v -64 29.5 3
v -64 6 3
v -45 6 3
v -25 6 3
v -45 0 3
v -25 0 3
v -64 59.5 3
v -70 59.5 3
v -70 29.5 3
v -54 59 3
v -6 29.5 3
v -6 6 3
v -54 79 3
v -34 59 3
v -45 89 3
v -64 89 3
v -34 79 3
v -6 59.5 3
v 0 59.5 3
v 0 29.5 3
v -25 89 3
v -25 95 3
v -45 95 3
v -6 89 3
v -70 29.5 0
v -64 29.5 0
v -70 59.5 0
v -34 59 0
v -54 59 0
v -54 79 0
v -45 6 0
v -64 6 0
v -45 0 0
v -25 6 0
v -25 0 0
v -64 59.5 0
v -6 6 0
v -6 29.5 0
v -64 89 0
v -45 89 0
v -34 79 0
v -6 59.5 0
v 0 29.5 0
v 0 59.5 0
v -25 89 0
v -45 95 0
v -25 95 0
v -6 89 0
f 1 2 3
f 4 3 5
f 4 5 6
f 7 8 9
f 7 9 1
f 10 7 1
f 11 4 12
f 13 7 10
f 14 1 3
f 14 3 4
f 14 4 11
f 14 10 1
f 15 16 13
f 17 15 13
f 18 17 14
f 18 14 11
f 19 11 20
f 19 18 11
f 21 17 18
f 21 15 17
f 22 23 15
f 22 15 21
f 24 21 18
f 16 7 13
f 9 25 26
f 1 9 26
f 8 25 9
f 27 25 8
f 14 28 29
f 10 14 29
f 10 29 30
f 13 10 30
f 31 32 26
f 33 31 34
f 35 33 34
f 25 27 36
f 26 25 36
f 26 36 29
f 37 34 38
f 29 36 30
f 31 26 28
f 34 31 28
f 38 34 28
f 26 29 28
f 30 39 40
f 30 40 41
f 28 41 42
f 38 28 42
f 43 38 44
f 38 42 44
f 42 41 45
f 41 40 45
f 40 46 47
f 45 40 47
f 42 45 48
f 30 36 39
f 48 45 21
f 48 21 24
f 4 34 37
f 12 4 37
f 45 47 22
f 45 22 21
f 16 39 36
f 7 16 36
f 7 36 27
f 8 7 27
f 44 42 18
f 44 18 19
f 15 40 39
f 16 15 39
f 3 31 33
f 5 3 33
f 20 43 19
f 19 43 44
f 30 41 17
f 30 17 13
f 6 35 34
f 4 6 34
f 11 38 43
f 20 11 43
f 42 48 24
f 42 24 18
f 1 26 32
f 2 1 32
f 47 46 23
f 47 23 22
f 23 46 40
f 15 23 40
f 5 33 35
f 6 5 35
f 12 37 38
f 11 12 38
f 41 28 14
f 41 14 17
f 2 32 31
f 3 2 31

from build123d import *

# Parameters (mm, degrees)
ESQUISSE1_W             = 70
ESQUISSE1_H             = 95
BOSS_EXTRU_1_DEPTH      = 3
ESQUISSE2_W             = 20
ESQUISSE2_H             = 20
ENL_V_MAT_EXTRU_1_DEPTH = 119.042365276


with BuildPart() as part:
    # Esquisse1 → Boss.-Extru.1 (new body)
    with BuildSketch(Plane.XY):
        with Locations((-35, 47.5)):
            Rectangle(ESQUISSE1_W, ESQUISSE1_H)
    extrude(amount=BOSS_EXTRU_1_DEPTH)

    # Esquisse2 → Enlèv. mat.-Extru.1 (cut, through all)
    with BuildSketch(Plane(origin=(0, 0, 0), x_dir=(-1, 0, 0), z_dir=(0, 0, -1))):
        Polygon((0, 95), (25, 95), (25, 89), (6, 89), (6, 59.5), (0, 59.5), align=None)
        Polygon((70, 95), (45, 95), (45, 89), (64, 89), (64, 59.5), (70, 59.5), align=None)
        Polygon((0, 0), (25, 0), (25, 6), (6, 6), (6, 29.5), (0, 29.5), align=None)
        Polygon((45, 0), (70, 0), (70, 29.5), (64, 29.5), (64, 6), (45, 6), align=None)
        with Locations((44, 69)):
            Rectangle(ESQUISSE2_W, ESQUISSE2_H)
    extrude(amount=-ENL_V_MAT_EXTRU_1_DEPTH, mode=Mode.SUBTRACT)


solid = part.part
